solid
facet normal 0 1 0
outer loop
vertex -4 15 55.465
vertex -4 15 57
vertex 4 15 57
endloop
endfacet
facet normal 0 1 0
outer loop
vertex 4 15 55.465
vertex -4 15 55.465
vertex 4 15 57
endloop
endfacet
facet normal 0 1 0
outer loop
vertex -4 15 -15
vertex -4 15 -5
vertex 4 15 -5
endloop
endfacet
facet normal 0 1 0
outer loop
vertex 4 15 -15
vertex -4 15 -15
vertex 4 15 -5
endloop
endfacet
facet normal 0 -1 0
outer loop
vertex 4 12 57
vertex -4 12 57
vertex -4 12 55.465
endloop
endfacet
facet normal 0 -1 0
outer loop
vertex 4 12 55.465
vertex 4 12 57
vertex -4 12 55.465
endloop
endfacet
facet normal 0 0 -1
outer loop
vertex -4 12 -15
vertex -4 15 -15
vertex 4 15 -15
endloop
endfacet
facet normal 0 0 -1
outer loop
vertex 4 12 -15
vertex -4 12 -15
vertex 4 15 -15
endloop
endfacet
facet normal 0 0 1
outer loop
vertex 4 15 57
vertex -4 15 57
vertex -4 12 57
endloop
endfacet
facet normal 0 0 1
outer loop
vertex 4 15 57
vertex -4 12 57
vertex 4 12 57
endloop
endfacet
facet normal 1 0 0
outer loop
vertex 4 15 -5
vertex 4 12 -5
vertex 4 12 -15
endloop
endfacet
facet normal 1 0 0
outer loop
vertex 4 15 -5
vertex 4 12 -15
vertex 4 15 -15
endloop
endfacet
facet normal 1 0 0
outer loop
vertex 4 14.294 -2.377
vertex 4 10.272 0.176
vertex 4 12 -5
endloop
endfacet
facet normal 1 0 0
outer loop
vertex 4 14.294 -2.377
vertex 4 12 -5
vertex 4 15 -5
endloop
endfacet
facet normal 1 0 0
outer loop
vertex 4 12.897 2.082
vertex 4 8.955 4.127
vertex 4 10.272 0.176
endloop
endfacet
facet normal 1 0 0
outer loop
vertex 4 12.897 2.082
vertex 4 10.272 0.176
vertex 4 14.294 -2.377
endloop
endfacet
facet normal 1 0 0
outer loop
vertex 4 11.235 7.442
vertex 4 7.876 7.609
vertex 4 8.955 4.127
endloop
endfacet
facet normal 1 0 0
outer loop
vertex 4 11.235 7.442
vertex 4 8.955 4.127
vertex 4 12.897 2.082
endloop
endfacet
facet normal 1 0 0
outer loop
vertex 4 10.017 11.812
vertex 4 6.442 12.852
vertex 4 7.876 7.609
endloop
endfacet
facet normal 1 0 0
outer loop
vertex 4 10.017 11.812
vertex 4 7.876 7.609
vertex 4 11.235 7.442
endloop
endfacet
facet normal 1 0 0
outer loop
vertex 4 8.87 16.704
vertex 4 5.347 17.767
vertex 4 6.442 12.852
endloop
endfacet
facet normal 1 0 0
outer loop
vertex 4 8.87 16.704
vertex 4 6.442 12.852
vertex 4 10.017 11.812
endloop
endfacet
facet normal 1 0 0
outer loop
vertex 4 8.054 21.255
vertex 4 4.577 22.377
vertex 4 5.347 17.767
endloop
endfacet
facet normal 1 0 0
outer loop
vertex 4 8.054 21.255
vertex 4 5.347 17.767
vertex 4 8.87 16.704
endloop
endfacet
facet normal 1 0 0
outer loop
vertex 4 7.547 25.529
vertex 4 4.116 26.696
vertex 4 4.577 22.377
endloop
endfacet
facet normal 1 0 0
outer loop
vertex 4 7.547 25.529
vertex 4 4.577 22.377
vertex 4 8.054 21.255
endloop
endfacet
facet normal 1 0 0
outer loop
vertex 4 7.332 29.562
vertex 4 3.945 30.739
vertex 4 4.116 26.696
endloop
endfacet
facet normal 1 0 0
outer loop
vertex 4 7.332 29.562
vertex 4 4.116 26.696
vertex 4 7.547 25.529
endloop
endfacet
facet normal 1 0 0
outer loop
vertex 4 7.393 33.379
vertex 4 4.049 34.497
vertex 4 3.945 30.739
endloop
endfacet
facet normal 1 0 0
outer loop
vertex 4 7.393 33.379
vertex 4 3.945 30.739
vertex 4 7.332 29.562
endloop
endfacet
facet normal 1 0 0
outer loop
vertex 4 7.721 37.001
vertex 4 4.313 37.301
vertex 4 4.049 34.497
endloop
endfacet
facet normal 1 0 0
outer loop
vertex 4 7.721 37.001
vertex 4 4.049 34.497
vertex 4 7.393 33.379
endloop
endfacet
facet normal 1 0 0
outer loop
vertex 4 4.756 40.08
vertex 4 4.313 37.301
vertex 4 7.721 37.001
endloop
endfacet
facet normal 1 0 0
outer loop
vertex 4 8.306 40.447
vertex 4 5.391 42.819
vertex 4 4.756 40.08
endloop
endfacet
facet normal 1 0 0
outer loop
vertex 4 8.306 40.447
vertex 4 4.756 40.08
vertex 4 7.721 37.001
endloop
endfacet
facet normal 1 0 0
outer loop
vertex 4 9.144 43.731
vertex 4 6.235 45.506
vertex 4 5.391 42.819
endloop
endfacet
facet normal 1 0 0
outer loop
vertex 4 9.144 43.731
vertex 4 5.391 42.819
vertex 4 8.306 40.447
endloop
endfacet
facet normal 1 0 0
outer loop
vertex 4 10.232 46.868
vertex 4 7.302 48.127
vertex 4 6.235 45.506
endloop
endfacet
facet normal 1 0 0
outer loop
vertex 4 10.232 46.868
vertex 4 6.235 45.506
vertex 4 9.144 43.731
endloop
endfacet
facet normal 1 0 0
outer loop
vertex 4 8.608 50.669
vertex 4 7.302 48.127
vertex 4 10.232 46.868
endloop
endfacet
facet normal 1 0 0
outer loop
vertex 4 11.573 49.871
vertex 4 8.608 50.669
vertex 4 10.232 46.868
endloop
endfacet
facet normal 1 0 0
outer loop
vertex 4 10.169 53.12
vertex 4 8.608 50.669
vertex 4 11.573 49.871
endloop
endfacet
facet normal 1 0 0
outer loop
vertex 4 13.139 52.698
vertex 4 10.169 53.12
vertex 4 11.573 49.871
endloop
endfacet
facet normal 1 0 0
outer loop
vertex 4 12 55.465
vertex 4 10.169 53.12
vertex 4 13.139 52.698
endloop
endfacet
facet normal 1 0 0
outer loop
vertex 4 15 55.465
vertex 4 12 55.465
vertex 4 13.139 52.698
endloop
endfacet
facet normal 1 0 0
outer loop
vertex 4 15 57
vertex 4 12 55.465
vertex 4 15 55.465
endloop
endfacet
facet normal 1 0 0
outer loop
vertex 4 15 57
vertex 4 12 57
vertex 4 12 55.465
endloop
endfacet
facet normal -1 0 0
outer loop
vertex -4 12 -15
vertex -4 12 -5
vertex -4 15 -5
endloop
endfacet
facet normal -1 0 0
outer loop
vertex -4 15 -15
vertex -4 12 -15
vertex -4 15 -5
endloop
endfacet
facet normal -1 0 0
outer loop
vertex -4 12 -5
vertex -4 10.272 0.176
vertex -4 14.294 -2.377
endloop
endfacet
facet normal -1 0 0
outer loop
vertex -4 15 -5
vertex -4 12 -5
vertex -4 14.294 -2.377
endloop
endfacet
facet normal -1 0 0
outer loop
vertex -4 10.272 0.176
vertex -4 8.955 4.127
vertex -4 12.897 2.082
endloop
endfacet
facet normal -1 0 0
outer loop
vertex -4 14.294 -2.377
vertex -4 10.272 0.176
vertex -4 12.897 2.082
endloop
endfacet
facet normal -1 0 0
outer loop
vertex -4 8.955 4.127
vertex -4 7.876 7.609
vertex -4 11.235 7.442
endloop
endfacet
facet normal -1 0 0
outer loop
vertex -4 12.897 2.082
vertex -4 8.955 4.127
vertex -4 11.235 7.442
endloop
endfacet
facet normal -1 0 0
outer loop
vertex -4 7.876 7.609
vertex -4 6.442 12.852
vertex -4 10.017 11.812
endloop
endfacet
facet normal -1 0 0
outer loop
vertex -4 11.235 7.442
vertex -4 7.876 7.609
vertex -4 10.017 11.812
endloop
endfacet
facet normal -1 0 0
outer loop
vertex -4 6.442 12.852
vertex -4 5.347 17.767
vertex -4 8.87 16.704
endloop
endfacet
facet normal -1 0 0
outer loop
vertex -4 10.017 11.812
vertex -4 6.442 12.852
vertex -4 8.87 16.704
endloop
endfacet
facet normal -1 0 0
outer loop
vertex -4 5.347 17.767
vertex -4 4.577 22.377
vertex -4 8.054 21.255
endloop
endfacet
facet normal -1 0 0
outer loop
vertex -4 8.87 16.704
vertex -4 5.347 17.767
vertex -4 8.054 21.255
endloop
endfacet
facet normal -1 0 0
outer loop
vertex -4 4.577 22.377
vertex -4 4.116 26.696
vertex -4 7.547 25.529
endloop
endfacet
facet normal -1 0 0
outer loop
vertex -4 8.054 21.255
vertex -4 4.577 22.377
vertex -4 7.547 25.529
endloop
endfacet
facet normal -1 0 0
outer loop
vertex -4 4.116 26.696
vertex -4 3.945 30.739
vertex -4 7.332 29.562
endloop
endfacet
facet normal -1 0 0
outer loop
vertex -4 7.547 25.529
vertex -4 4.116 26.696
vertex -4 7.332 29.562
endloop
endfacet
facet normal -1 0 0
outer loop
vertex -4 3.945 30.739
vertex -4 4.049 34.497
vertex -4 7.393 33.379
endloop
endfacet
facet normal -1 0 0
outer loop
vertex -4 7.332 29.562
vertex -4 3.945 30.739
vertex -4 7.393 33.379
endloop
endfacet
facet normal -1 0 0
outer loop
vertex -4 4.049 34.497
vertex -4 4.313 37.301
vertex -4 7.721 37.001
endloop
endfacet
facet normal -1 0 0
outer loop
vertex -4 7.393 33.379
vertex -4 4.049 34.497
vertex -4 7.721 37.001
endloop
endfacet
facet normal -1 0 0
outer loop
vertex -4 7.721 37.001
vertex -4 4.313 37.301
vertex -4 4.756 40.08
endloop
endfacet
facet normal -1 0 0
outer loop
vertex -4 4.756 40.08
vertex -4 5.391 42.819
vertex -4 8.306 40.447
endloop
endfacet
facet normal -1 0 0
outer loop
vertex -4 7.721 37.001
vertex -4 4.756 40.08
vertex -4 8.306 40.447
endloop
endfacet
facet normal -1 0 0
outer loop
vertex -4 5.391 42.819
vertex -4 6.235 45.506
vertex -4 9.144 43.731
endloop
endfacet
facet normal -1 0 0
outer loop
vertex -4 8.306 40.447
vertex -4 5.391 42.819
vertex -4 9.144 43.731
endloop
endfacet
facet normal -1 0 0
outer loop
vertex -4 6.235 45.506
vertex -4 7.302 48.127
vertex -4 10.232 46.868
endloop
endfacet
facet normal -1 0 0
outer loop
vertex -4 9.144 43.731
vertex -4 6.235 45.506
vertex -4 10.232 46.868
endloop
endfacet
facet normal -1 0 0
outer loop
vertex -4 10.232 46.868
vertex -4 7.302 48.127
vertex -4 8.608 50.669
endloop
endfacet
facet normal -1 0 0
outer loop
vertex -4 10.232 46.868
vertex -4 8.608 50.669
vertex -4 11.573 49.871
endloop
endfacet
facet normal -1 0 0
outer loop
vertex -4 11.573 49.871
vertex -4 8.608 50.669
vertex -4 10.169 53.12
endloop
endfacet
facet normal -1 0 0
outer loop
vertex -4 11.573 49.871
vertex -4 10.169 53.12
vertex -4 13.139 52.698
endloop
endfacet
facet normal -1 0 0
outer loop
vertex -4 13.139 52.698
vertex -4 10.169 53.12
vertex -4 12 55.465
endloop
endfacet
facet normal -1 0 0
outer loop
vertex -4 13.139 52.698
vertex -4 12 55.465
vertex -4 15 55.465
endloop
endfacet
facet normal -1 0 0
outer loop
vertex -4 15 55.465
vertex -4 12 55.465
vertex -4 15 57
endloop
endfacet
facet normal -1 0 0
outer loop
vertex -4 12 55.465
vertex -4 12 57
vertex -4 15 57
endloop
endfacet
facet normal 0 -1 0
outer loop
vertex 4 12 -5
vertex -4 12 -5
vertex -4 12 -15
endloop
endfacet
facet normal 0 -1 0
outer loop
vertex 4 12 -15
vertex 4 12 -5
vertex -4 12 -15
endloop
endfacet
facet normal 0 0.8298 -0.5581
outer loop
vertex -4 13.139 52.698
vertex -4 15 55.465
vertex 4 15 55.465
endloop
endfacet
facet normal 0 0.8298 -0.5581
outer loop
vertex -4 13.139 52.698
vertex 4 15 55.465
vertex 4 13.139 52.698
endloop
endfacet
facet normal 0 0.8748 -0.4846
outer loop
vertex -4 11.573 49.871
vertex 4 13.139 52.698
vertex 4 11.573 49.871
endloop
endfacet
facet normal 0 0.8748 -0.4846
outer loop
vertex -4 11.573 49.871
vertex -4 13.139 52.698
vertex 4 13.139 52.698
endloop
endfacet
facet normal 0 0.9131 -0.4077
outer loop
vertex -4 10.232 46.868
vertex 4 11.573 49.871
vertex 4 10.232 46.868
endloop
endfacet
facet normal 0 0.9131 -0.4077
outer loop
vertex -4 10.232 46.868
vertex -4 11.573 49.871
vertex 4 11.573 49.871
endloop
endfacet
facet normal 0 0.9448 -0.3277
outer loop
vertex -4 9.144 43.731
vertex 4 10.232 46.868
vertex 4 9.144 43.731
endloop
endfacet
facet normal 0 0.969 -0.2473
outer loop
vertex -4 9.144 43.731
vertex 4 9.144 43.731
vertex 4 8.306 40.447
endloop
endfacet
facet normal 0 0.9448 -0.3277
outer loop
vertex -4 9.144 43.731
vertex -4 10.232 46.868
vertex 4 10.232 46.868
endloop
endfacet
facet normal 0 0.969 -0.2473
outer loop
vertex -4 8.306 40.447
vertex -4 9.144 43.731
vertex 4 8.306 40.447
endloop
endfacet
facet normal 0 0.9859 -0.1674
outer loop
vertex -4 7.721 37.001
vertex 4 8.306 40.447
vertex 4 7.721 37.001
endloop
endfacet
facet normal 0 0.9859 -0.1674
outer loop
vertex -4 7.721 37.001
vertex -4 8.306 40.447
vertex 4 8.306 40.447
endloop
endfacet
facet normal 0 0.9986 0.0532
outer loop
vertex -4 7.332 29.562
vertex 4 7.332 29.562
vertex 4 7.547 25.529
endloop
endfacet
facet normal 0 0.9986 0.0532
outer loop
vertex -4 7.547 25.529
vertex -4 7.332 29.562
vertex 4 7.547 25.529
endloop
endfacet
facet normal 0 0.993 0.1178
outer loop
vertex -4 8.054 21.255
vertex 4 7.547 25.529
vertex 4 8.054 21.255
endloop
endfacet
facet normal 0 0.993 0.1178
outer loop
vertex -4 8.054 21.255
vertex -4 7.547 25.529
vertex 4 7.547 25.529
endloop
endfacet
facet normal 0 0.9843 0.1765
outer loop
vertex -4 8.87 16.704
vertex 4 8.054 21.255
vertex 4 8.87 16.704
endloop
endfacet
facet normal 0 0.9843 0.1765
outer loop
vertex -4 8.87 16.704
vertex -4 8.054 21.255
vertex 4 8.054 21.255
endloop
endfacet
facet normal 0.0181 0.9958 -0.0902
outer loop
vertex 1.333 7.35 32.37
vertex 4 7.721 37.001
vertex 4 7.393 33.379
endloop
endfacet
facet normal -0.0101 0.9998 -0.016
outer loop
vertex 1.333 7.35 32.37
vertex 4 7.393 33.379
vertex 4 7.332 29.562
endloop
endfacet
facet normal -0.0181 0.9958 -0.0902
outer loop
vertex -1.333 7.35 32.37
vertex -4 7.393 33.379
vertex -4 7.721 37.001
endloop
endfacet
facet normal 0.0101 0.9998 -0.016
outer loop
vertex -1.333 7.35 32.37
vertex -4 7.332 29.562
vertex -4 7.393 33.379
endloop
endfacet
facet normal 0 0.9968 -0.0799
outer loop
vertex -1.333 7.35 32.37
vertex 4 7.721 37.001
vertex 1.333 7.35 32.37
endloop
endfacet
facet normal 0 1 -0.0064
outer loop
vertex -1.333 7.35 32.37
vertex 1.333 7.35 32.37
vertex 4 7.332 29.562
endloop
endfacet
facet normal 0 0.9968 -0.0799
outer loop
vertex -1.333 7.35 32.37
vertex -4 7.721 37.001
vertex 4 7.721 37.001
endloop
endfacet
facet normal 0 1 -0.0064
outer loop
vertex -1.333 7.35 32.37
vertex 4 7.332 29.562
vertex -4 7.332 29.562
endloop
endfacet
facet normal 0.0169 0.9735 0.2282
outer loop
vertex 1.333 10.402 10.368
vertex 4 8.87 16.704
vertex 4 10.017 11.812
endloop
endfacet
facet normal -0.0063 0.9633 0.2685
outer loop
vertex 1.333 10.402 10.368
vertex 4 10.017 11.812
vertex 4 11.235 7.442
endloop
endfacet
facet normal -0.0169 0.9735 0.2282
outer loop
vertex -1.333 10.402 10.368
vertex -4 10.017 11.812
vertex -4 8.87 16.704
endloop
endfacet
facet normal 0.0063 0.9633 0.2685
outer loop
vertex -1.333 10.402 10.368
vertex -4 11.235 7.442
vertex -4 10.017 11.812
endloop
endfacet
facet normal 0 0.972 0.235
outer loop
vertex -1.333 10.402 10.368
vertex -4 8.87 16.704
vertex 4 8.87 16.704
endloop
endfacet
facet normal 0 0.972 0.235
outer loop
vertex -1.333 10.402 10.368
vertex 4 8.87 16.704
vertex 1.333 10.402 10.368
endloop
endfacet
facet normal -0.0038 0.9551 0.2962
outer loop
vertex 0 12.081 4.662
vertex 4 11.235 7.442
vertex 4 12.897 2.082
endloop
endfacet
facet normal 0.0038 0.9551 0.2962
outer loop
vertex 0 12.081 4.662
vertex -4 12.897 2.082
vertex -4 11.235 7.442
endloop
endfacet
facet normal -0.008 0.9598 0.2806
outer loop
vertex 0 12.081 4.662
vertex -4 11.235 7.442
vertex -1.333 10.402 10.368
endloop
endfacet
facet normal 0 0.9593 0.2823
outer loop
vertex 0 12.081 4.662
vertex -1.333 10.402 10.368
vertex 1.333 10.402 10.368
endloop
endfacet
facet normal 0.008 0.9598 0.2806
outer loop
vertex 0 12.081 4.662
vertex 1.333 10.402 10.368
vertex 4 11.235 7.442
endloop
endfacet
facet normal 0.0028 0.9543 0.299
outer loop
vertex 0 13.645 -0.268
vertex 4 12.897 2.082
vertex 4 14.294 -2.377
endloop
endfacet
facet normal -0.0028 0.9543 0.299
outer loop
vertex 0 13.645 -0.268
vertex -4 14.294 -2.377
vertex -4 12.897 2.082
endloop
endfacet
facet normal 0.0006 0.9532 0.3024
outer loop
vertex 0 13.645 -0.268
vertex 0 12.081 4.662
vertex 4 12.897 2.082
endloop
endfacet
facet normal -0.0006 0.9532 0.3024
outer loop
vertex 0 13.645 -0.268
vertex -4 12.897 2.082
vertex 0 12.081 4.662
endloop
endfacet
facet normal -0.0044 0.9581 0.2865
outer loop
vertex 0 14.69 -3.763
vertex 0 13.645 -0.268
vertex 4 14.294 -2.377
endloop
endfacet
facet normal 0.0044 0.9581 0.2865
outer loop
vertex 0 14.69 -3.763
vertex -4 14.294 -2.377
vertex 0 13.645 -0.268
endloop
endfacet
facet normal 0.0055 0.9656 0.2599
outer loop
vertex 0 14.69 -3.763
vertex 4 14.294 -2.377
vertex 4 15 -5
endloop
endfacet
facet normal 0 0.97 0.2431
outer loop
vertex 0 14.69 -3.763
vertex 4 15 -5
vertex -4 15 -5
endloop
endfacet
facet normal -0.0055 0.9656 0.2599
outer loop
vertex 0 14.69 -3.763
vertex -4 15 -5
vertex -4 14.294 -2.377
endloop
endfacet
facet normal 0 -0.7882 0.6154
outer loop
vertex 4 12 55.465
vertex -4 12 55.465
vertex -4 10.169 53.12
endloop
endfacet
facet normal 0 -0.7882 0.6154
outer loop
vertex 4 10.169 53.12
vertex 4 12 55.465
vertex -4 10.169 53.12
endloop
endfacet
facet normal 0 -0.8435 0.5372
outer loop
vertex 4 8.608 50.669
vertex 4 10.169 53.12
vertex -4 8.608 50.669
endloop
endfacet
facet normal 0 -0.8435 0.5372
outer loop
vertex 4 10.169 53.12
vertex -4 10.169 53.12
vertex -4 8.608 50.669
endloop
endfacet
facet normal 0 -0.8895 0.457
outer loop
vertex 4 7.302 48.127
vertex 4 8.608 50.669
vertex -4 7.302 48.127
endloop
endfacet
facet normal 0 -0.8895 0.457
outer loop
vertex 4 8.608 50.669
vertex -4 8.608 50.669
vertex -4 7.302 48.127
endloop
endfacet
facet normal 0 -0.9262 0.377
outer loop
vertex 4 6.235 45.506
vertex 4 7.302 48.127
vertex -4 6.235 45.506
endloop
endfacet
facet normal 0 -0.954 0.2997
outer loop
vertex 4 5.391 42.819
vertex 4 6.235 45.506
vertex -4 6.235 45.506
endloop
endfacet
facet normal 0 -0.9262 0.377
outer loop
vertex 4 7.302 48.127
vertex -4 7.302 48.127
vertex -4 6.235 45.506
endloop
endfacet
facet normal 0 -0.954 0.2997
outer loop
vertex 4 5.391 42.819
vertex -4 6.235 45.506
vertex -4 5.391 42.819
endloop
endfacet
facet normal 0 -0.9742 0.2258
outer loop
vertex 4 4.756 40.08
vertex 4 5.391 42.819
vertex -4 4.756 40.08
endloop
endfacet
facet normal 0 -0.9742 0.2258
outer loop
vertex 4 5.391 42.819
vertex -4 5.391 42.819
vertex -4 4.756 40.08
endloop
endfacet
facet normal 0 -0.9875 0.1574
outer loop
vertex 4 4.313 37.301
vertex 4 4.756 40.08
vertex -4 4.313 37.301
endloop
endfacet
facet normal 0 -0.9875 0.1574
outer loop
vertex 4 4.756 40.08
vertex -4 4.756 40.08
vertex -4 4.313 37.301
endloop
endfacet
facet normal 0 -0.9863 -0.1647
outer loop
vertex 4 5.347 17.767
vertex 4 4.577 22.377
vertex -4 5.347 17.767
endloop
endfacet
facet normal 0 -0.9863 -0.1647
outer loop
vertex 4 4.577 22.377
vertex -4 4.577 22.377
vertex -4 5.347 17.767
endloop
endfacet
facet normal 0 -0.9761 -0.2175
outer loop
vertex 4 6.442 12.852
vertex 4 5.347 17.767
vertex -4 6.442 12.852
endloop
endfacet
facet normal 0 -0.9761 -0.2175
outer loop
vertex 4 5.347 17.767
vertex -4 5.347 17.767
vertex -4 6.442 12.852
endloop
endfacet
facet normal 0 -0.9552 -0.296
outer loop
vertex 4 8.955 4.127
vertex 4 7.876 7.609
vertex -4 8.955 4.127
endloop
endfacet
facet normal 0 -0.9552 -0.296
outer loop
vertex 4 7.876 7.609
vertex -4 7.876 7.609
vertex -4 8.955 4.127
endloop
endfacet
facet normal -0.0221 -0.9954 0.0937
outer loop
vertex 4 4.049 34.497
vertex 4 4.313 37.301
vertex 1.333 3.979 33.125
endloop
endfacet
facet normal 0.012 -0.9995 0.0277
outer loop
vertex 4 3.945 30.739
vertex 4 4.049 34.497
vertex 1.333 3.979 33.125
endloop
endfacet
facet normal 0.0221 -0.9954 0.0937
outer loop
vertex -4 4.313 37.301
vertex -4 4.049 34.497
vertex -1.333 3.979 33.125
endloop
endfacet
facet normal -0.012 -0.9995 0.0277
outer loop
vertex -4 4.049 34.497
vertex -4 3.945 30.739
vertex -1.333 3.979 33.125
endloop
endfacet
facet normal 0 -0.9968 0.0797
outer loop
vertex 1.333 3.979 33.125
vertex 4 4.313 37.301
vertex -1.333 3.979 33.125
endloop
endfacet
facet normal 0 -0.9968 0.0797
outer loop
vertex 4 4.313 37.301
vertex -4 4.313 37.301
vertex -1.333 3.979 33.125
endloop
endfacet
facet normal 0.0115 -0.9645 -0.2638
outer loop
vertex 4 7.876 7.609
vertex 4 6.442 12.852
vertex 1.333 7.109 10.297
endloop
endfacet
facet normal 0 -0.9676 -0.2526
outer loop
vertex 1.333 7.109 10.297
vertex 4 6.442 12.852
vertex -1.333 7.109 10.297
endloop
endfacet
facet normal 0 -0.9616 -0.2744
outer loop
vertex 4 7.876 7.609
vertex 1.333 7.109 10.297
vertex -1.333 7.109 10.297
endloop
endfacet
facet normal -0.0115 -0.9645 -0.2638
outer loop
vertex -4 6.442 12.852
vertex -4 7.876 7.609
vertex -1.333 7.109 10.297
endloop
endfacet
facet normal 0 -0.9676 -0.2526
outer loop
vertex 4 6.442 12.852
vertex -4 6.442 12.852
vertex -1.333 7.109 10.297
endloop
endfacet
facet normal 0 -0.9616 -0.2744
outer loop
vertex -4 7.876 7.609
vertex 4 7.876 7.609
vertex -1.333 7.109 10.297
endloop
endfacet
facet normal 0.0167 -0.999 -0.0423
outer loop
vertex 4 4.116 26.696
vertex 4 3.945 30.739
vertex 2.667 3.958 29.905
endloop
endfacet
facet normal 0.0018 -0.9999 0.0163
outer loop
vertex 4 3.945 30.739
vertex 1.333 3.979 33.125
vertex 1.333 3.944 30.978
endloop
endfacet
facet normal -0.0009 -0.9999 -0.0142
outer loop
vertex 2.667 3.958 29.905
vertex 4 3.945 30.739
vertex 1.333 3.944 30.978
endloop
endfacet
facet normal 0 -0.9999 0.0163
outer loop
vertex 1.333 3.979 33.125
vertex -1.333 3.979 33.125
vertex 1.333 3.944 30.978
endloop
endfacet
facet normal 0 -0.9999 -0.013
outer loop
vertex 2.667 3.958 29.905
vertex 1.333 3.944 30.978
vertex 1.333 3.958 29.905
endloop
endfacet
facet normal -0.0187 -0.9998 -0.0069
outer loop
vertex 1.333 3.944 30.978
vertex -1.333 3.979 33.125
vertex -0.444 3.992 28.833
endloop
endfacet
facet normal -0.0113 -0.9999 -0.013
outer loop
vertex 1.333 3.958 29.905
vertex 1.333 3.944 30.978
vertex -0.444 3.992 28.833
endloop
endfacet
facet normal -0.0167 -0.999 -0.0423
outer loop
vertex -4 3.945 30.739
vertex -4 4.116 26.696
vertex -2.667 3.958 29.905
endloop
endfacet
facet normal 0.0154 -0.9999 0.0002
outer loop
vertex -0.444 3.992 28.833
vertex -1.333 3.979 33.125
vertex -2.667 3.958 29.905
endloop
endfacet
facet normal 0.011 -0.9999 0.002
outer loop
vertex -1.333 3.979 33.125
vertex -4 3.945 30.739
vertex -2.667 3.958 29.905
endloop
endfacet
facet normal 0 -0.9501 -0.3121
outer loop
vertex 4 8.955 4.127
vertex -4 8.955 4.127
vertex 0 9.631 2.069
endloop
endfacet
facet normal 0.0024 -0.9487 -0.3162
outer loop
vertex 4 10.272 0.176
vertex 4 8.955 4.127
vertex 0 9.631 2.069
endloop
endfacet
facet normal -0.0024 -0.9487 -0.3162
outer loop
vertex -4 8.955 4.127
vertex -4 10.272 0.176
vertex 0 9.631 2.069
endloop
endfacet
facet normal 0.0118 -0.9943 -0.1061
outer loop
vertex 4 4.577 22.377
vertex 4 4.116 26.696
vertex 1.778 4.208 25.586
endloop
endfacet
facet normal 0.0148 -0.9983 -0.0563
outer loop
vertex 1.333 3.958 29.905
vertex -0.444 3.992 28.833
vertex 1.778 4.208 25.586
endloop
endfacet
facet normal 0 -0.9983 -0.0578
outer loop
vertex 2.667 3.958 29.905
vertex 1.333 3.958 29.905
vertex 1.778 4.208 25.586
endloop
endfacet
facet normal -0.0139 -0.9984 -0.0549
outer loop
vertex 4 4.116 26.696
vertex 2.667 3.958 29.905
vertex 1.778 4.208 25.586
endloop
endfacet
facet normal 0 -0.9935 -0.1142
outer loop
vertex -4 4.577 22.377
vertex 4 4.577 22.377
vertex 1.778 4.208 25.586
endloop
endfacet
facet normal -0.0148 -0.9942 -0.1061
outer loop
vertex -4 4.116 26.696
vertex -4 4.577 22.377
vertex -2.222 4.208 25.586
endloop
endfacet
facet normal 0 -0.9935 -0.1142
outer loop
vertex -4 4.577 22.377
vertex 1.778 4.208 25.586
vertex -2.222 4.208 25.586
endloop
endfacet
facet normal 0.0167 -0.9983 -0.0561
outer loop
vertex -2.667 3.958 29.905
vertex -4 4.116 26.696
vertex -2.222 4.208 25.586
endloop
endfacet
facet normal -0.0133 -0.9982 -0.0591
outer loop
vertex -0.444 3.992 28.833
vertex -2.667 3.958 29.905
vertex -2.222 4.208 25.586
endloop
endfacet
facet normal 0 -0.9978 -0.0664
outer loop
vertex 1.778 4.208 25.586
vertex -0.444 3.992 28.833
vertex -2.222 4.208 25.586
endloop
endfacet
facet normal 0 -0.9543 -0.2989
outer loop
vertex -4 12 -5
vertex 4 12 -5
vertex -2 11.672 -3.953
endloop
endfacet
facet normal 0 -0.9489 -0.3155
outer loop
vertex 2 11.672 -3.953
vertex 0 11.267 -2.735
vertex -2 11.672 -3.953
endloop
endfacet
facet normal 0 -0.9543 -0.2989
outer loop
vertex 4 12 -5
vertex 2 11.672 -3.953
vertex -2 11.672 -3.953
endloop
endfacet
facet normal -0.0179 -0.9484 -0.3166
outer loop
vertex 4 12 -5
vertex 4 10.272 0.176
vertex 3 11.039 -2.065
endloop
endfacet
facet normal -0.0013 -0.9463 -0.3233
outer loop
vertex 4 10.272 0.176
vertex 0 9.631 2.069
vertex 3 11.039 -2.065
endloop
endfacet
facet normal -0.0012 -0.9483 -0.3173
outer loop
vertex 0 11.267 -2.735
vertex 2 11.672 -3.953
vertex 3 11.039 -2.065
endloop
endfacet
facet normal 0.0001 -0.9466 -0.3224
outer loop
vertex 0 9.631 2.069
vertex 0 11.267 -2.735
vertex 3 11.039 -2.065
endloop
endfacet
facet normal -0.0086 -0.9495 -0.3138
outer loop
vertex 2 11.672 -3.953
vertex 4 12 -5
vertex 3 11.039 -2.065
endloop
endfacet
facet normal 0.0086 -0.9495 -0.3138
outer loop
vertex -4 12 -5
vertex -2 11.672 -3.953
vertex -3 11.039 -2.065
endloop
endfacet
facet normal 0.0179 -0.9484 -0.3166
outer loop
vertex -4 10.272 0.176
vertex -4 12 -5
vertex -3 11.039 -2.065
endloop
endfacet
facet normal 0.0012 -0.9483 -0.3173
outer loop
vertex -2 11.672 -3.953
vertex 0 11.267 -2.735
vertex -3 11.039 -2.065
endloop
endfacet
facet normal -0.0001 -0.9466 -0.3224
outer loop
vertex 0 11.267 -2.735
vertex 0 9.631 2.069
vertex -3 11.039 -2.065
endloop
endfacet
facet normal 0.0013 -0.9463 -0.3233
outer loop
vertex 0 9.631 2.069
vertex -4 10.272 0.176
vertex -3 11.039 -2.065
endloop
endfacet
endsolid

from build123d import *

# Parameters (mm, degrees)
F0_W     = 8
F0_H     = 30
F1_DEPTH = 57
F2_DEPTH = 15
F4_DEPTH = 8


with BuildPart() as f1:
    # F0 (on Top) → F1 (new body)
    with BuildSketch(Plane.XY):
        Rectangle(F0_W, F0_H)
    extrude(amount=F1_DEPTH)

    # F2 (add): a face of the model
    f2_faces = [f1.faces().sort_by_distance(p)[0] for p in [
        (0, 0, 0),
    ]]
    extrude(f2_faces, amount=F2_DEPTH)

    # F3 (on face) → F4 (cut, through all)
    with BuildSketch(Plane(origin=(-4, 0, 0), x_dir=(0, -1, 0), z_dir=(-1, 0, 0))):
        with BuildLine():
            Line((15, 57), (-12, 57))
            Line((-12, 57), (-12, 55.4652698338))
            add(Edge.make_bspline(
                [(-12, 55.4652698338), (4.7257277183, 36.0407754779), (-9.3587208539, 3.8601619937), (-12, -5)],
                knots=[0, 0, 0, 0, 60.4652698338, 60.4652698338, 60.4652698338, 60.4652698338], degree=3))
            Line((-12, -5), (-12, -15))
            Line((-12, -15), (15, -15))
            Line((15, -15), (15, 57))
        make_face()
        with BuildLine():
            add(Edge.make_bspline(
                [(-15, 55.4652698338), (1.0521842632, 33.6701404303), (-12.6800062135, 5.2046555839), (-15, -5)],
                knots=[0, 0, 0, 0, 60.4652698338, 60.4652698338, 60.4652698338, 60.4652698338], degree=3))
            Line((-15, 55.4652698338), (-15, -5))
        make_face()
    extrude(amount=-F4_DEPTH, mode=Mode.SUBTRACT)


solid = f1.part
